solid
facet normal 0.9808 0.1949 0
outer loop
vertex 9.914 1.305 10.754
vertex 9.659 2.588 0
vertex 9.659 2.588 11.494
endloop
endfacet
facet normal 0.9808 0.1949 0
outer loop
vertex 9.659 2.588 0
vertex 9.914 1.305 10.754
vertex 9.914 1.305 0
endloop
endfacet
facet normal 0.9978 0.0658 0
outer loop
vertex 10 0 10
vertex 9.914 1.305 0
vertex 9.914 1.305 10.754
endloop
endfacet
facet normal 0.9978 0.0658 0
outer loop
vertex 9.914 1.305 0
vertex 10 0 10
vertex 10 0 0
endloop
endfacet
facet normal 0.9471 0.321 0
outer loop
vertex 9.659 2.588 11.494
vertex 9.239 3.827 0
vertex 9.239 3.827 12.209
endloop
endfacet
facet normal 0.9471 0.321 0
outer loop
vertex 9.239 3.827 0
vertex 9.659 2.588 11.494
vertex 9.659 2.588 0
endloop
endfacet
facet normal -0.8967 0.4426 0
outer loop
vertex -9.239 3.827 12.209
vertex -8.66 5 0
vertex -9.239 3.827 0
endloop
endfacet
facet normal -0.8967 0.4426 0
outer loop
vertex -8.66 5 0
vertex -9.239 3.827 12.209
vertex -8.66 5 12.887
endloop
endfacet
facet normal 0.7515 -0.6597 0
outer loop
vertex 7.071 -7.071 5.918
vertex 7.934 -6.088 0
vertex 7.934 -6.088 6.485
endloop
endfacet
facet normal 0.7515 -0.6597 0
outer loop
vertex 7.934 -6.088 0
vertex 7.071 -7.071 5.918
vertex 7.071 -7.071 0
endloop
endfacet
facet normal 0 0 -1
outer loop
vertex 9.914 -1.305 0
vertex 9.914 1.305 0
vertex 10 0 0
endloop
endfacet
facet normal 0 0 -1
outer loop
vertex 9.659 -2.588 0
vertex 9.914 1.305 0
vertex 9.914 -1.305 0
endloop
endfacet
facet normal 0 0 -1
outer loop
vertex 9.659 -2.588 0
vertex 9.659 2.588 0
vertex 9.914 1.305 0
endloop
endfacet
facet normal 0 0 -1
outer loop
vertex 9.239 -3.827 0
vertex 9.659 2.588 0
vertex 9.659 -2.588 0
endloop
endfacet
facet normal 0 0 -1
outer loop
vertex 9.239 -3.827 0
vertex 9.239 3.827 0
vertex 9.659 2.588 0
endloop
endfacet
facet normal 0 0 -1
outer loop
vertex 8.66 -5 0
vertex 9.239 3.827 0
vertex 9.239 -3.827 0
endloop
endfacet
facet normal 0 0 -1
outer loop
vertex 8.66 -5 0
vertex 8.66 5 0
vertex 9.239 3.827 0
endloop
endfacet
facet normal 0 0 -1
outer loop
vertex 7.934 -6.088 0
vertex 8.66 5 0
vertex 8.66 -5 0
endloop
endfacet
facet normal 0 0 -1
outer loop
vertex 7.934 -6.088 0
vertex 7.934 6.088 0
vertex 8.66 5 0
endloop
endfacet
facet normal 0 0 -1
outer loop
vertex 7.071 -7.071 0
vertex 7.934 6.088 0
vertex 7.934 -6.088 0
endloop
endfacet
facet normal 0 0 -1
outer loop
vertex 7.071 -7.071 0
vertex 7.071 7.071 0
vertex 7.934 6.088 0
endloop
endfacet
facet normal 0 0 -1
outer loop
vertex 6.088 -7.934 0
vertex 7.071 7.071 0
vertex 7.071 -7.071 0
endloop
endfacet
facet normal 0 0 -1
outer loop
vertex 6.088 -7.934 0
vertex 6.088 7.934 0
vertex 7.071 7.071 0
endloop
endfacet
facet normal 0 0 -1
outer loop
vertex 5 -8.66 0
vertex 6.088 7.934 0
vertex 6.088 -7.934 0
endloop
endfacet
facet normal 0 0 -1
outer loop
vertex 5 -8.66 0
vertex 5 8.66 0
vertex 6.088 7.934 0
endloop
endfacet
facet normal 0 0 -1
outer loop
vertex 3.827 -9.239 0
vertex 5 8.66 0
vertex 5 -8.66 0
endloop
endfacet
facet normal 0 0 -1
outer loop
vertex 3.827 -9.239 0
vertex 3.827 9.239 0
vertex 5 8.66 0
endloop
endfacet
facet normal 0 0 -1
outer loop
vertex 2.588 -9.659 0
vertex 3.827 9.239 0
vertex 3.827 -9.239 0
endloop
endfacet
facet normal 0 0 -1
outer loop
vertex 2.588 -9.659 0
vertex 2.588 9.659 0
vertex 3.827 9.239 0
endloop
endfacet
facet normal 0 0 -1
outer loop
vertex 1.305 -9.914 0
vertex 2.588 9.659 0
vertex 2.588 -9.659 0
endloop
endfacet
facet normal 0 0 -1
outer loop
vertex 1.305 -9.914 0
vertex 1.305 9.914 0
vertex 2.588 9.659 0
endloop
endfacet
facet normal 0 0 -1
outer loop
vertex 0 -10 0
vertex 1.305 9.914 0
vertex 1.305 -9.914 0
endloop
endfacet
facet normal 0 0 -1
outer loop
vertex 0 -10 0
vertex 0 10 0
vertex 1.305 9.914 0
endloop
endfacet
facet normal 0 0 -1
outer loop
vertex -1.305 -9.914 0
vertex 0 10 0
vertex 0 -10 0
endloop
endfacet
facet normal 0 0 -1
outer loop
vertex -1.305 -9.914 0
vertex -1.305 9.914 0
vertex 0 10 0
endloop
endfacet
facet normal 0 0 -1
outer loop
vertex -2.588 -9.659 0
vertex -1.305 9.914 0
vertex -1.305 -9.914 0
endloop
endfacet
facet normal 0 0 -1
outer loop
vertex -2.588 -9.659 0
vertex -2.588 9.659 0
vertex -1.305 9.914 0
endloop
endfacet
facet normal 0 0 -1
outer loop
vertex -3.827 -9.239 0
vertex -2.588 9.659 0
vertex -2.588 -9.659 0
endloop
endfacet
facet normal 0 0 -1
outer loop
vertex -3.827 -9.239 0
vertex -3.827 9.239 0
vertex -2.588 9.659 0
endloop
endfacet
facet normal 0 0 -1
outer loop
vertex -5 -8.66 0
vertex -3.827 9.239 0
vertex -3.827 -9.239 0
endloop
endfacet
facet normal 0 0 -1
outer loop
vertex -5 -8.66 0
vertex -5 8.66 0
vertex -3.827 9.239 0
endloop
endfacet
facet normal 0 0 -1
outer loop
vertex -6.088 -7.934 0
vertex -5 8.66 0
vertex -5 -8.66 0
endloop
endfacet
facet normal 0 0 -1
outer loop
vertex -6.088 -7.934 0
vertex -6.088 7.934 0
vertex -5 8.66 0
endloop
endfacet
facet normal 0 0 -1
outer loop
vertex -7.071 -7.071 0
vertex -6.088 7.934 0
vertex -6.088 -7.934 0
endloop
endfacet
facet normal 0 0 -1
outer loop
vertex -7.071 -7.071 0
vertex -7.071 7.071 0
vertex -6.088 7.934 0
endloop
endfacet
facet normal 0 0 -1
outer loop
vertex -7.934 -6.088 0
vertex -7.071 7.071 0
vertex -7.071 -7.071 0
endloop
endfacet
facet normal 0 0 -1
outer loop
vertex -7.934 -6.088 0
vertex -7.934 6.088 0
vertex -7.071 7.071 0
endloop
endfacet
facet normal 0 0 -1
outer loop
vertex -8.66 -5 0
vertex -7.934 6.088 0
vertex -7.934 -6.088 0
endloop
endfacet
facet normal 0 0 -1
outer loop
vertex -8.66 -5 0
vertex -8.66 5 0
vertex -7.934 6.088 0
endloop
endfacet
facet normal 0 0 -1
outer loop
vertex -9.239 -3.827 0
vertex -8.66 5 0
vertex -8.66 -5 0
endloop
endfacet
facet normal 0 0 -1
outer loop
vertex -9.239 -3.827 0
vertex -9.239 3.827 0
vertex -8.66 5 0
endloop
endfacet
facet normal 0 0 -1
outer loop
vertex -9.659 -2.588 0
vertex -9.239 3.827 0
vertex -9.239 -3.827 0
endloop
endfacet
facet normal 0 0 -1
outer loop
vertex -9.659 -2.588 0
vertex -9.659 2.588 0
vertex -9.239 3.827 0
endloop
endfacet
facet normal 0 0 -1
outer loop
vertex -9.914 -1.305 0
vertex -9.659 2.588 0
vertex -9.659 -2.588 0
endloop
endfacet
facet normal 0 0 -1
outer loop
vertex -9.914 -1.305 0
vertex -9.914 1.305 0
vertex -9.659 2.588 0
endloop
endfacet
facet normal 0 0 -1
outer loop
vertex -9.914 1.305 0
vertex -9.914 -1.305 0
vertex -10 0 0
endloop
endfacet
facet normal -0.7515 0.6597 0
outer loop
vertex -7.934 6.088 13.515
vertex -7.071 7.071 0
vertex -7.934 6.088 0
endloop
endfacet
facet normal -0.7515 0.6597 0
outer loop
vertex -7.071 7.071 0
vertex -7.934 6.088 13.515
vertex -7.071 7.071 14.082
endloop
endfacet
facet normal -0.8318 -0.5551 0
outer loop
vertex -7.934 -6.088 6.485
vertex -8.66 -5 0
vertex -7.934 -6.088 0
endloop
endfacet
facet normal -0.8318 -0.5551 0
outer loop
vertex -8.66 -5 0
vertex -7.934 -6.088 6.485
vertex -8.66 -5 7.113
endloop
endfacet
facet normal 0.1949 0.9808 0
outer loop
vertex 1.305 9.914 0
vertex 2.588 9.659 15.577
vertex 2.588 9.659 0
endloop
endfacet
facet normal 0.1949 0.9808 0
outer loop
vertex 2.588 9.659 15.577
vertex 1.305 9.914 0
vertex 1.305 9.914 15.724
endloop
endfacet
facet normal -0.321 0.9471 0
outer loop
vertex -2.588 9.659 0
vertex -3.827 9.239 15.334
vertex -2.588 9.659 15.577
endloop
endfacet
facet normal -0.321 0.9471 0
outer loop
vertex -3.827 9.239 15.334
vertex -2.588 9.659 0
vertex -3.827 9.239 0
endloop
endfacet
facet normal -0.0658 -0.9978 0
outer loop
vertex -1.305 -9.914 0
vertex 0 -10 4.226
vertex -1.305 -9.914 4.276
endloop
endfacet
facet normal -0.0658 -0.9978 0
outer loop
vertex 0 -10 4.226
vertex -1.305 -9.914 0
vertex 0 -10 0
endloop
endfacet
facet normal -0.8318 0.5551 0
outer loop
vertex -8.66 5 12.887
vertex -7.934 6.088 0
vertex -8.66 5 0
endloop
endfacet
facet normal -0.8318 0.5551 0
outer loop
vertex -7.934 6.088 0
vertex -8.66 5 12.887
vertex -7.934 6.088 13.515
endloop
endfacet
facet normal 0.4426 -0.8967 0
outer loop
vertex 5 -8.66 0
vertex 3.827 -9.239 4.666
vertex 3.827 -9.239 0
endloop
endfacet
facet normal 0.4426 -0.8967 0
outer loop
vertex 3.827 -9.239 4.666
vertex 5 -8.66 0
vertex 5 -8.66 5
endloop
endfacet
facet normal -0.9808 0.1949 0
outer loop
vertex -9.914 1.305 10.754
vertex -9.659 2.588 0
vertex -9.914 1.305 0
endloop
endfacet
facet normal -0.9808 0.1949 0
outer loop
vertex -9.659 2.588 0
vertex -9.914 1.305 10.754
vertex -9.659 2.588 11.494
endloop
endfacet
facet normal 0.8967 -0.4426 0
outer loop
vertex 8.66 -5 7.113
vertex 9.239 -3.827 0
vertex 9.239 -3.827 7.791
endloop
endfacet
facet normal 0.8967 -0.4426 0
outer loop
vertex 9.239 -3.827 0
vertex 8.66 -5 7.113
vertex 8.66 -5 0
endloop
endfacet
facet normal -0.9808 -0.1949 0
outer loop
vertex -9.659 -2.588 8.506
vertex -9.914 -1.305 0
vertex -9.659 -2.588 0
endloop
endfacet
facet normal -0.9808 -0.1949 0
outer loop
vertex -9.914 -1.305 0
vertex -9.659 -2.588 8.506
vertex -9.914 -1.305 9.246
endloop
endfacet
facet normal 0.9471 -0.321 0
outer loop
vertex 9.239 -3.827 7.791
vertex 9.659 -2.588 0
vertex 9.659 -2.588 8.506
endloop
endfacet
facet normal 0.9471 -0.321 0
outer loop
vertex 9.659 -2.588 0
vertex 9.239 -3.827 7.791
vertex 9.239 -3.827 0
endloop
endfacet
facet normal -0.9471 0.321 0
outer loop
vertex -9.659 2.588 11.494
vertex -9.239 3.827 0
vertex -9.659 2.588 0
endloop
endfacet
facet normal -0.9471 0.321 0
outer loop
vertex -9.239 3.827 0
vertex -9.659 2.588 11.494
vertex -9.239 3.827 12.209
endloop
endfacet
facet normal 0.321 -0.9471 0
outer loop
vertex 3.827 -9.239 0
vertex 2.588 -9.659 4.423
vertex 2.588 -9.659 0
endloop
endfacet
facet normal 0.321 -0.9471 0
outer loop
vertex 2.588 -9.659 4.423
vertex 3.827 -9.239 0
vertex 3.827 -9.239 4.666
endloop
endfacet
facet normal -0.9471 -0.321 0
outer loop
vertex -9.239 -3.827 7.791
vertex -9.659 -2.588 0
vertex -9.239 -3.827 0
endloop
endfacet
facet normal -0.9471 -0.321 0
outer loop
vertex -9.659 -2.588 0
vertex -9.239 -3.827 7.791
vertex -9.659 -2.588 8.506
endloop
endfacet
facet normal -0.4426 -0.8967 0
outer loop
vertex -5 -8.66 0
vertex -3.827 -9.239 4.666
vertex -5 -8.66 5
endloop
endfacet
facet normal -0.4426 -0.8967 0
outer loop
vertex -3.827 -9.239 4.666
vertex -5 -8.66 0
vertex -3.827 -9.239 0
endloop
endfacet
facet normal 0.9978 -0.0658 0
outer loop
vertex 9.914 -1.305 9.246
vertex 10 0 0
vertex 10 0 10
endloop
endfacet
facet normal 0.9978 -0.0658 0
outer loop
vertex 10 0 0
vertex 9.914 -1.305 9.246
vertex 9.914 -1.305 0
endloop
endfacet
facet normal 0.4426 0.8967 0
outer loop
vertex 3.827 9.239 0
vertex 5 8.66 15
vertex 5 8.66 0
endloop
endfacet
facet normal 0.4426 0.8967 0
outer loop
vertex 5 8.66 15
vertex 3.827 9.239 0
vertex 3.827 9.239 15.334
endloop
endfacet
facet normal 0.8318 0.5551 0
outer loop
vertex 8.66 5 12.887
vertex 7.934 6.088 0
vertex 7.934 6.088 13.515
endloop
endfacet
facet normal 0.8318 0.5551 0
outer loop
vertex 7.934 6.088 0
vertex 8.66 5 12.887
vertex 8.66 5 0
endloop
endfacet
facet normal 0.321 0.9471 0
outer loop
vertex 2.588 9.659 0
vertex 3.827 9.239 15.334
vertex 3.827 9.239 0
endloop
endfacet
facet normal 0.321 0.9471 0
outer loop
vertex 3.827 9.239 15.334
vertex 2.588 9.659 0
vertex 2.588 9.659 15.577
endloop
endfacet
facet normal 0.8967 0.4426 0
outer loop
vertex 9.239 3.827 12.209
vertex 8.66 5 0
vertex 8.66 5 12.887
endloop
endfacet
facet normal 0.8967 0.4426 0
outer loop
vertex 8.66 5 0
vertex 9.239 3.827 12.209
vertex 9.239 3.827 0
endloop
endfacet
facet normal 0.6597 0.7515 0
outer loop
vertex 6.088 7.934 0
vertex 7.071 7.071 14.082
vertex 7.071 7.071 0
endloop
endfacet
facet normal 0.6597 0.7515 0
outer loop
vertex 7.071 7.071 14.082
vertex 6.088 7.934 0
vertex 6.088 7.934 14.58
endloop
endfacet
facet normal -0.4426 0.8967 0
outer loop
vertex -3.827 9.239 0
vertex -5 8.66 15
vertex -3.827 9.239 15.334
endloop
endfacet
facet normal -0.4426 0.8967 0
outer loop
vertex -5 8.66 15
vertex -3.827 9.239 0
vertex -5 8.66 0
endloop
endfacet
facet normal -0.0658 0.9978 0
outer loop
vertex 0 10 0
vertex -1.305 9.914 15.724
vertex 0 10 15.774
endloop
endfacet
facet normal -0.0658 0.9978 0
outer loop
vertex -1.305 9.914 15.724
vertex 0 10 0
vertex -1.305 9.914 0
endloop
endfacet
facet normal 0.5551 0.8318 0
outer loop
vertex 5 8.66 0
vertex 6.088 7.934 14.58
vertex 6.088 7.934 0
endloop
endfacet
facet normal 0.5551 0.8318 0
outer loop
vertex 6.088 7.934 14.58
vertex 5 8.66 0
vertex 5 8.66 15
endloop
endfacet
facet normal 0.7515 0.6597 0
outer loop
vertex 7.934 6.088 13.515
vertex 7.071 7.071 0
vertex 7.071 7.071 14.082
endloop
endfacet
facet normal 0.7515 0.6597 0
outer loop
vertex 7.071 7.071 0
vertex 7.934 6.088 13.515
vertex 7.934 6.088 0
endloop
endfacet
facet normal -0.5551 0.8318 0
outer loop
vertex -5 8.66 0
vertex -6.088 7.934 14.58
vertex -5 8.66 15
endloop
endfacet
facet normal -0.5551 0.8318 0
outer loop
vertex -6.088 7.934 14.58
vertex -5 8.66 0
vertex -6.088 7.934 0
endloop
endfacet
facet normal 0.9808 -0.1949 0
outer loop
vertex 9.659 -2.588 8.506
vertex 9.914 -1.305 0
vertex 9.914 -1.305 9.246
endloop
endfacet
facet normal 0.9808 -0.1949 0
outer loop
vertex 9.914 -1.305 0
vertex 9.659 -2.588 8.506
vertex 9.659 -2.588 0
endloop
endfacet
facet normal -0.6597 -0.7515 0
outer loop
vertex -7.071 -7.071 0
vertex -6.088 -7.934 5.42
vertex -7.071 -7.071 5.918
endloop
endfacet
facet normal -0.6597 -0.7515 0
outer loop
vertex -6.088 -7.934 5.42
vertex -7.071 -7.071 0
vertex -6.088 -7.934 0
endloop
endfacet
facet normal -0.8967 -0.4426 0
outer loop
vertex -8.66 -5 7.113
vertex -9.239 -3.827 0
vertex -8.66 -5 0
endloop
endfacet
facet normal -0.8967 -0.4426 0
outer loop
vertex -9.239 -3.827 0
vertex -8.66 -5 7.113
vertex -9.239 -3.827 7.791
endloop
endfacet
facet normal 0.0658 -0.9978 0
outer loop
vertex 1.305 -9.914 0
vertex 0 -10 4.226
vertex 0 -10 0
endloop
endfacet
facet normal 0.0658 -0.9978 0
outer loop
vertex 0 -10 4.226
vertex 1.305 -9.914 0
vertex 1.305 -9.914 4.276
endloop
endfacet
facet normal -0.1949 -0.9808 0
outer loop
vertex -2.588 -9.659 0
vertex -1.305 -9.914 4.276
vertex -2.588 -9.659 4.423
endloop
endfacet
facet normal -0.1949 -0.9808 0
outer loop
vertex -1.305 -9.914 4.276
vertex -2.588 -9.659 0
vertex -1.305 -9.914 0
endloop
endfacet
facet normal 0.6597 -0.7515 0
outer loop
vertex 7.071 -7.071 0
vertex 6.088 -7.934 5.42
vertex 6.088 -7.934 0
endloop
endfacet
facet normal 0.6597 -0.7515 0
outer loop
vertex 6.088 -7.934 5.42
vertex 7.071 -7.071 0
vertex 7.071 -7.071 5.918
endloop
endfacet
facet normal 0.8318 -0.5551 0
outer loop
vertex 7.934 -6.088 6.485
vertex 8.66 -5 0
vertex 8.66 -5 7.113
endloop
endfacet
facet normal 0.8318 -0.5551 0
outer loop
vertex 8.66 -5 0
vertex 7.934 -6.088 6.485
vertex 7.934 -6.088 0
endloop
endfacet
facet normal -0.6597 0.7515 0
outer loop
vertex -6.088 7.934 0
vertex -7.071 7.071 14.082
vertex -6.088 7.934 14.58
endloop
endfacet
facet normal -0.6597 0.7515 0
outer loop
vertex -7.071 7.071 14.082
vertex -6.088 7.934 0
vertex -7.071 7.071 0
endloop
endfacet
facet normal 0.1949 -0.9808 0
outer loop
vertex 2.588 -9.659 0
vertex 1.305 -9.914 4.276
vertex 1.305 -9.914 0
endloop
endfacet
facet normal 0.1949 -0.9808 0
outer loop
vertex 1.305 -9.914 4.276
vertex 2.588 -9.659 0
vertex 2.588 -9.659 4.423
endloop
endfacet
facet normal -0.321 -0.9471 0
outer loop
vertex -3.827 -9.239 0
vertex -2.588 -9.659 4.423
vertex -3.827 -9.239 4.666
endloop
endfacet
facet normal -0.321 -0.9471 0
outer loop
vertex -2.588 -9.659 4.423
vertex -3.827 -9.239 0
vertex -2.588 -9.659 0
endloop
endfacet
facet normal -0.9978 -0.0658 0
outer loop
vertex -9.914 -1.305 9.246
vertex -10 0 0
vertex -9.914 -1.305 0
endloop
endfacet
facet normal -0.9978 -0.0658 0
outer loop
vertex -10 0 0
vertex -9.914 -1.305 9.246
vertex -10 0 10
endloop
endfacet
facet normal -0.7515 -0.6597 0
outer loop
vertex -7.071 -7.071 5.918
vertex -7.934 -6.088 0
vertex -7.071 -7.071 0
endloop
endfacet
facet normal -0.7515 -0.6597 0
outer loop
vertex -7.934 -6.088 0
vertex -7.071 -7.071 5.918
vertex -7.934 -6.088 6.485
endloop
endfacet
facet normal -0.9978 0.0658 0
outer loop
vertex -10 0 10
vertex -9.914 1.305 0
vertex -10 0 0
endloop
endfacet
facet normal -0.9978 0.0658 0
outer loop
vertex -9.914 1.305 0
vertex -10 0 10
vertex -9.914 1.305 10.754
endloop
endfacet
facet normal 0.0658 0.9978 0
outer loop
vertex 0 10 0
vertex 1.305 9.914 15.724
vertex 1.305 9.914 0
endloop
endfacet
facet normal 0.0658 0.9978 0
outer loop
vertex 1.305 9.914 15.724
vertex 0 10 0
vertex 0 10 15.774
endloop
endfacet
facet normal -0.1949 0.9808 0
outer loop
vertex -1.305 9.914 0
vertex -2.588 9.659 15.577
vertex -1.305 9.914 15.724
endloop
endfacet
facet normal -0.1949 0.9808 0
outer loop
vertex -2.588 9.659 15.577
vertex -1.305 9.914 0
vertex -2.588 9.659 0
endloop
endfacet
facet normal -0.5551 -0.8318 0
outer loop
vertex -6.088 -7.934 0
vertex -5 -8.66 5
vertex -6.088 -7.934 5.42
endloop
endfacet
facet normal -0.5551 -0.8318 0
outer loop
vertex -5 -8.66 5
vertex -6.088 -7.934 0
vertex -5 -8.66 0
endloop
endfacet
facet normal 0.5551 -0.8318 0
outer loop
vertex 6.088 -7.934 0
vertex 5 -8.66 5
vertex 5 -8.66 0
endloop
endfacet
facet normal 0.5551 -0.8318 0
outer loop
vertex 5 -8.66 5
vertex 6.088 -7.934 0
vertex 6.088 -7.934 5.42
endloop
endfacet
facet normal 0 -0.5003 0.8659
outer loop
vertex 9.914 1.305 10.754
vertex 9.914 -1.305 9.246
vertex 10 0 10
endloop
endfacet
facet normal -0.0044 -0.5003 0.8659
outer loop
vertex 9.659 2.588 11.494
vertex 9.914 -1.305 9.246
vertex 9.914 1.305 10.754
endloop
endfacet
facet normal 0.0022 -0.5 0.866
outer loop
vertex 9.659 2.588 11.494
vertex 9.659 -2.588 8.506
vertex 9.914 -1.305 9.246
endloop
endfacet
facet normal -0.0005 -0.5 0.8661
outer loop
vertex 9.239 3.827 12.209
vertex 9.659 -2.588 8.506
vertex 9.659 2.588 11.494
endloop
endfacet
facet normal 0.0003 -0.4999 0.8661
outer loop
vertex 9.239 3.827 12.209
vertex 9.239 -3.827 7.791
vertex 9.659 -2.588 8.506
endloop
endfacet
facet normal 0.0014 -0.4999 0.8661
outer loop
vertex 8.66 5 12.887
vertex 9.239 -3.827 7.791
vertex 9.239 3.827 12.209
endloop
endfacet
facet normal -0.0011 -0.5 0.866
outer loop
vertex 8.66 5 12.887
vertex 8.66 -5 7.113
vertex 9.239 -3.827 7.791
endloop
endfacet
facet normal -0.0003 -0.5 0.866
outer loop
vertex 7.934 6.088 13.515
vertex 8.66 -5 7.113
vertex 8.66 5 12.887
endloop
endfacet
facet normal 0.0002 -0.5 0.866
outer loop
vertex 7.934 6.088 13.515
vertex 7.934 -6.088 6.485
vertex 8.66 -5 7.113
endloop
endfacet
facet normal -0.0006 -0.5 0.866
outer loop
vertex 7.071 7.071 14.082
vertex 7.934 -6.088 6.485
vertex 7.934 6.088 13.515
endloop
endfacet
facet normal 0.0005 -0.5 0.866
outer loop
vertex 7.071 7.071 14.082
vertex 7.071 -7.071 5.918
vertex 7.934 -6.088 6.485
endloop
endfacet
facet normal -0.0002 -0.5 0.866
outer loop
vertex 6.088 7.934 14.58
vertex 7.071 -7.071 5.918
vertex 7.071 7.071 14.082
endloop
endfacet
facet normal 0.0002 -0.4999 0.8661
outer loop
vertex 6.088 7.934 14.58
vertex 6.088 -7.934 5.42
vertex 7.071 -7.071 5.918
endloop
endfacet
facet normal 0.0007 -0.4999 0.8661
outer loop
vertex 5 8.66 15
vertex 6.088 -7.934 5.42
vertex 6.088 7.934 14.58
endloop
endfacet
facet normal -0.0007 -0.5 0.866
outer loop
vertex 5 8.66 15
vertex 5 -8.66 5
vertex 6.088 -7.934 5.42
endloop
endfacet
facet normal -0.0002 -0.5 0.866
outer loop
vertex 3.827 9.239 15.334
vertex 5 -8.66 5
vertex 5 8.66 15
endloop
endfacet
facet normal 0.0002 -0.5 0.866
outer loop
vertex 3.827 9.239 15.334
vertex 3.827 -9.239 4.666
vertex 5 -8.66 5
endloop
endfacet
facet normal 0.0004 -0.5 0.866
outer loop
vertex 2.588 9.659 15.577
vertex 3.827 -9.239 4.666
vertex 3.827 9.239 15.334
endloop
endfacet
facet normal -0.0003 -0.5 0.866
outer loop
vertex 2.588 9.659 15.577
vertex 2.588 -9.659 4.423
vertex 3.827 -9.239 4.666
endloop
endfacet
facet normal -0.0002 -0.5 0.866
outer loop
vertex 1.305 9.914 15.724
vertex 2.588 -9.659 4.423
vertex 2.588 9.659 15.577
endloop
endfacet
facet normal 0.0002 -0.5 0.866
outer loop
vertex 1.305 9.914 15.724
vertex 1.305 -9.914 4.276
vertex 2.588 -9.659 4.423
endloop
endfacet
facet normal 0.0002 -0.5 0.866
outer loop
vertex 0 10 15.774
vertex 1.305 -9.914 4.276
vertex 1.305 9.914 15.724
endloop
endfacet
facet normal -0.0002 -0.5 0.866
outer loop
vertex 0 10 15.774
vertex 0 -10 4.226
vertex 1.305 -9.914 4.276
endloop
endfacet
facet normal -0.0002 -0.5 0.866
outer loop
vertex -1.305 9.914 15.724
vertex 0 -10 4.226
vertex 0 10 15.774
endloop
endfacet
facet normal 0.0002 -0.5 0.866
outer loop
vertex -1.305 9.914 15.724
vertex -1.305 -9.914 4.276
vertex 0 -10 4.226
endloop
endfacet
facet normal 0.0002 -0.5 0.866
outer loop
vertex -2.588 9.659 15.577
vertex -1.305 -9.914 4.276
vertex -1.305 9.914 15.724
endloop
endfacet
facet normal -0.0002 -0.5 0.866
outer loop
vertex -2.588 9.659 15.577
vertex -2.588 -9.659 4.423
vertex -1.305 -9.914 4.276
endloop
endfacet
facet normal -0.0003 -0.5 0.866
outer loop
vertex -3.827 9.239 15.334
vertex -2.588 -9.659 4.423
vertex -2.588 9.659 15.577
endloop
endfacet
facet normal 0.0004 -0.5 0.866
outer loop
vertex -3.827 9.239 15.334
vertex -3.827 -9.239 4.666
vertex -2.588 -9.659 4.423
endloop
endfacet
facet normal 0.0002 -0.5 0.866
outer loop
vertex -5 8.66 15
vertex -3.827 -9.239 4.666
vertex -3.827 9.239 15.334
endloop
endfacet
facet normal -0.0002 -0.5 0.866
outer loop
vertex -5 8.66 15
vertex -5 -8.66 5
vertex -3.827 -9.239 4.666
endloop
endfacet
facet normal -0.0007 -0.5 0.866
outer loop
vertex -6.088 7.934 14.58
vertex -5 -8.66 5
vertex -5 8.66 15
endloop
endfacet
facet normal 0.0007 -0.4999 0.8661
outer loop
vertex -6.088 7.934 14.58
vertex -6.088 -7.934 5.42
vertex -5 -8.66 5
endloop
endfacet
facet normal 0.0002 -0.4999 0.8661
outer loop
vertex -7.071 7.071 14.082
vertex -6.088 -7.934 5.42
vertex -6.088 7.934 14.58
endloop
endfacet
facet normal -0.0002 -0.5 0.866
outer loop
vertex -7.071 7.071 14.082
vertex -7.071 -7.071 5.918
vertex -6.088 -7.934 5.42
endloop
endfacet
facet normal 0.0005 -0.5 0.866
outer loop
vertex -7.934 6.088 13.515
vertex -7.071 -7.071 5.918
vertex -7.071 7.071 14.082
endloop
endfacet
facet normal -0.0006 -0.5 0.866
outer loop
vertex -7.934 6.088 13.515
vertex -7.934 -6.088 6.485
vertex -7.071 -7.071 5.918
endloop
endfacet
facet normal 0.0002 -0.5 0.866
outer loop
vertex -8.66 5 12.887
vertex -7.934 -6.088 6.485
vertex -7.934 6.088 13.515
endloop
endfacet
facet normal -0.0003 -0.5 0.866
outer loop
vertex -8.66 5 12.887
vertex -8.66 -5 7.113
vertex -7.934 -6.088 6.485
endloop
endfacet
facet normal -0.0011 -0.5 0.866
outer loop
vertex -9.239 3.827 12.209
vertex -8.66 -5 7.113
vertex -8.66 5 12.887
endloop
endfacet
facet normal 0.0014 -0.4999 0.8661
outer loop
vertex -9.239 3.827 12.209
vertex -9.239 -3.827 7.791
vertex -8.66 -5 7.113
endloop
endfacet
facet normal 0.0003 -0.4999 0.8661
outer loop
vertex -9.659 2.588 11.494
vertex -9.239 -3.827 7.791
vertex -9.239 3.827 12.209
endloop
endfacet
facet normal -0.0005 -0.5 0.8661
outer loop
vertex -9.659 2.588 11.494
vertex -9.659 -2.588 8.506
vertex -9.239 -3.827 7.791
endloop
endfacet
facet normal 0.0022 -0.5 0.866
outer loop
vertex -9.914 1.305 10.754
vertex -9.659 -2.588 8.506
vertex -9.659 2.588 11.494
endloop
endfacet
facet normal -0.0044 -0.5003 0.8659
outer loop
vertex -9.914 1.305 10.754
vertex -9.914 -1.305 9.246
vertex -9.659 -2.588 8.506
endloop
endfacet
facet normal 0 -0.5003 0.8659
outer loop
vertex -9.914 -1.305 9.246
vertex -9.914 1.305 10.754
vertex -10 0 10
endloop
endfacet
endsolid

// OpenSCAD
// A cylinder cut by a plane at an angle: the first case past one cylindrical
// grid for the boundary evaluated from the model's declarations
// (src/geometry/model/Boundary.h, doc/step-export-wip.md item 42).
//
// cylinder(r = 10, h = 20), less everything above the plane through (0, 0, 10)
// tilted 30 degrees about x: z = 10 + y tan 30, which runs from 4.23 to 15.77
// across the wall - inside its height all round. The model's boundary is three
// faces - the wall between the bottom circle and the cut's ellipse, the bottom
// disk, and the cut, an ellipse with semi-axes 10 / cos 30 = 11.547 and 10 -
// with two edges, each a whole conic, and material on the axis.
//
// The cube's front edge lies exactly in the bottom's plane, 20 along -m from
// (0, 0, 10) at z = 10 - 20 sin 30 = 0: three declared planes share a line
// there, outside the cylinder - which the evaluation has to read as no edge,
// not as a point it cannot decide.
//
// The model's volume: the plane passes through the axis and the cut is
// symmetric across it, so the mean height over the disk is 10:
//
//     pi * 10^2 * 10 = 1000 pi = 3141.592654

difference() {
	cylinder(r = 10, h = 20, $fn = 48);
	translate([0, 0, 10]) rotate([30, 0, 0]) translate([-20, -20, 0]) cube(40);
}
